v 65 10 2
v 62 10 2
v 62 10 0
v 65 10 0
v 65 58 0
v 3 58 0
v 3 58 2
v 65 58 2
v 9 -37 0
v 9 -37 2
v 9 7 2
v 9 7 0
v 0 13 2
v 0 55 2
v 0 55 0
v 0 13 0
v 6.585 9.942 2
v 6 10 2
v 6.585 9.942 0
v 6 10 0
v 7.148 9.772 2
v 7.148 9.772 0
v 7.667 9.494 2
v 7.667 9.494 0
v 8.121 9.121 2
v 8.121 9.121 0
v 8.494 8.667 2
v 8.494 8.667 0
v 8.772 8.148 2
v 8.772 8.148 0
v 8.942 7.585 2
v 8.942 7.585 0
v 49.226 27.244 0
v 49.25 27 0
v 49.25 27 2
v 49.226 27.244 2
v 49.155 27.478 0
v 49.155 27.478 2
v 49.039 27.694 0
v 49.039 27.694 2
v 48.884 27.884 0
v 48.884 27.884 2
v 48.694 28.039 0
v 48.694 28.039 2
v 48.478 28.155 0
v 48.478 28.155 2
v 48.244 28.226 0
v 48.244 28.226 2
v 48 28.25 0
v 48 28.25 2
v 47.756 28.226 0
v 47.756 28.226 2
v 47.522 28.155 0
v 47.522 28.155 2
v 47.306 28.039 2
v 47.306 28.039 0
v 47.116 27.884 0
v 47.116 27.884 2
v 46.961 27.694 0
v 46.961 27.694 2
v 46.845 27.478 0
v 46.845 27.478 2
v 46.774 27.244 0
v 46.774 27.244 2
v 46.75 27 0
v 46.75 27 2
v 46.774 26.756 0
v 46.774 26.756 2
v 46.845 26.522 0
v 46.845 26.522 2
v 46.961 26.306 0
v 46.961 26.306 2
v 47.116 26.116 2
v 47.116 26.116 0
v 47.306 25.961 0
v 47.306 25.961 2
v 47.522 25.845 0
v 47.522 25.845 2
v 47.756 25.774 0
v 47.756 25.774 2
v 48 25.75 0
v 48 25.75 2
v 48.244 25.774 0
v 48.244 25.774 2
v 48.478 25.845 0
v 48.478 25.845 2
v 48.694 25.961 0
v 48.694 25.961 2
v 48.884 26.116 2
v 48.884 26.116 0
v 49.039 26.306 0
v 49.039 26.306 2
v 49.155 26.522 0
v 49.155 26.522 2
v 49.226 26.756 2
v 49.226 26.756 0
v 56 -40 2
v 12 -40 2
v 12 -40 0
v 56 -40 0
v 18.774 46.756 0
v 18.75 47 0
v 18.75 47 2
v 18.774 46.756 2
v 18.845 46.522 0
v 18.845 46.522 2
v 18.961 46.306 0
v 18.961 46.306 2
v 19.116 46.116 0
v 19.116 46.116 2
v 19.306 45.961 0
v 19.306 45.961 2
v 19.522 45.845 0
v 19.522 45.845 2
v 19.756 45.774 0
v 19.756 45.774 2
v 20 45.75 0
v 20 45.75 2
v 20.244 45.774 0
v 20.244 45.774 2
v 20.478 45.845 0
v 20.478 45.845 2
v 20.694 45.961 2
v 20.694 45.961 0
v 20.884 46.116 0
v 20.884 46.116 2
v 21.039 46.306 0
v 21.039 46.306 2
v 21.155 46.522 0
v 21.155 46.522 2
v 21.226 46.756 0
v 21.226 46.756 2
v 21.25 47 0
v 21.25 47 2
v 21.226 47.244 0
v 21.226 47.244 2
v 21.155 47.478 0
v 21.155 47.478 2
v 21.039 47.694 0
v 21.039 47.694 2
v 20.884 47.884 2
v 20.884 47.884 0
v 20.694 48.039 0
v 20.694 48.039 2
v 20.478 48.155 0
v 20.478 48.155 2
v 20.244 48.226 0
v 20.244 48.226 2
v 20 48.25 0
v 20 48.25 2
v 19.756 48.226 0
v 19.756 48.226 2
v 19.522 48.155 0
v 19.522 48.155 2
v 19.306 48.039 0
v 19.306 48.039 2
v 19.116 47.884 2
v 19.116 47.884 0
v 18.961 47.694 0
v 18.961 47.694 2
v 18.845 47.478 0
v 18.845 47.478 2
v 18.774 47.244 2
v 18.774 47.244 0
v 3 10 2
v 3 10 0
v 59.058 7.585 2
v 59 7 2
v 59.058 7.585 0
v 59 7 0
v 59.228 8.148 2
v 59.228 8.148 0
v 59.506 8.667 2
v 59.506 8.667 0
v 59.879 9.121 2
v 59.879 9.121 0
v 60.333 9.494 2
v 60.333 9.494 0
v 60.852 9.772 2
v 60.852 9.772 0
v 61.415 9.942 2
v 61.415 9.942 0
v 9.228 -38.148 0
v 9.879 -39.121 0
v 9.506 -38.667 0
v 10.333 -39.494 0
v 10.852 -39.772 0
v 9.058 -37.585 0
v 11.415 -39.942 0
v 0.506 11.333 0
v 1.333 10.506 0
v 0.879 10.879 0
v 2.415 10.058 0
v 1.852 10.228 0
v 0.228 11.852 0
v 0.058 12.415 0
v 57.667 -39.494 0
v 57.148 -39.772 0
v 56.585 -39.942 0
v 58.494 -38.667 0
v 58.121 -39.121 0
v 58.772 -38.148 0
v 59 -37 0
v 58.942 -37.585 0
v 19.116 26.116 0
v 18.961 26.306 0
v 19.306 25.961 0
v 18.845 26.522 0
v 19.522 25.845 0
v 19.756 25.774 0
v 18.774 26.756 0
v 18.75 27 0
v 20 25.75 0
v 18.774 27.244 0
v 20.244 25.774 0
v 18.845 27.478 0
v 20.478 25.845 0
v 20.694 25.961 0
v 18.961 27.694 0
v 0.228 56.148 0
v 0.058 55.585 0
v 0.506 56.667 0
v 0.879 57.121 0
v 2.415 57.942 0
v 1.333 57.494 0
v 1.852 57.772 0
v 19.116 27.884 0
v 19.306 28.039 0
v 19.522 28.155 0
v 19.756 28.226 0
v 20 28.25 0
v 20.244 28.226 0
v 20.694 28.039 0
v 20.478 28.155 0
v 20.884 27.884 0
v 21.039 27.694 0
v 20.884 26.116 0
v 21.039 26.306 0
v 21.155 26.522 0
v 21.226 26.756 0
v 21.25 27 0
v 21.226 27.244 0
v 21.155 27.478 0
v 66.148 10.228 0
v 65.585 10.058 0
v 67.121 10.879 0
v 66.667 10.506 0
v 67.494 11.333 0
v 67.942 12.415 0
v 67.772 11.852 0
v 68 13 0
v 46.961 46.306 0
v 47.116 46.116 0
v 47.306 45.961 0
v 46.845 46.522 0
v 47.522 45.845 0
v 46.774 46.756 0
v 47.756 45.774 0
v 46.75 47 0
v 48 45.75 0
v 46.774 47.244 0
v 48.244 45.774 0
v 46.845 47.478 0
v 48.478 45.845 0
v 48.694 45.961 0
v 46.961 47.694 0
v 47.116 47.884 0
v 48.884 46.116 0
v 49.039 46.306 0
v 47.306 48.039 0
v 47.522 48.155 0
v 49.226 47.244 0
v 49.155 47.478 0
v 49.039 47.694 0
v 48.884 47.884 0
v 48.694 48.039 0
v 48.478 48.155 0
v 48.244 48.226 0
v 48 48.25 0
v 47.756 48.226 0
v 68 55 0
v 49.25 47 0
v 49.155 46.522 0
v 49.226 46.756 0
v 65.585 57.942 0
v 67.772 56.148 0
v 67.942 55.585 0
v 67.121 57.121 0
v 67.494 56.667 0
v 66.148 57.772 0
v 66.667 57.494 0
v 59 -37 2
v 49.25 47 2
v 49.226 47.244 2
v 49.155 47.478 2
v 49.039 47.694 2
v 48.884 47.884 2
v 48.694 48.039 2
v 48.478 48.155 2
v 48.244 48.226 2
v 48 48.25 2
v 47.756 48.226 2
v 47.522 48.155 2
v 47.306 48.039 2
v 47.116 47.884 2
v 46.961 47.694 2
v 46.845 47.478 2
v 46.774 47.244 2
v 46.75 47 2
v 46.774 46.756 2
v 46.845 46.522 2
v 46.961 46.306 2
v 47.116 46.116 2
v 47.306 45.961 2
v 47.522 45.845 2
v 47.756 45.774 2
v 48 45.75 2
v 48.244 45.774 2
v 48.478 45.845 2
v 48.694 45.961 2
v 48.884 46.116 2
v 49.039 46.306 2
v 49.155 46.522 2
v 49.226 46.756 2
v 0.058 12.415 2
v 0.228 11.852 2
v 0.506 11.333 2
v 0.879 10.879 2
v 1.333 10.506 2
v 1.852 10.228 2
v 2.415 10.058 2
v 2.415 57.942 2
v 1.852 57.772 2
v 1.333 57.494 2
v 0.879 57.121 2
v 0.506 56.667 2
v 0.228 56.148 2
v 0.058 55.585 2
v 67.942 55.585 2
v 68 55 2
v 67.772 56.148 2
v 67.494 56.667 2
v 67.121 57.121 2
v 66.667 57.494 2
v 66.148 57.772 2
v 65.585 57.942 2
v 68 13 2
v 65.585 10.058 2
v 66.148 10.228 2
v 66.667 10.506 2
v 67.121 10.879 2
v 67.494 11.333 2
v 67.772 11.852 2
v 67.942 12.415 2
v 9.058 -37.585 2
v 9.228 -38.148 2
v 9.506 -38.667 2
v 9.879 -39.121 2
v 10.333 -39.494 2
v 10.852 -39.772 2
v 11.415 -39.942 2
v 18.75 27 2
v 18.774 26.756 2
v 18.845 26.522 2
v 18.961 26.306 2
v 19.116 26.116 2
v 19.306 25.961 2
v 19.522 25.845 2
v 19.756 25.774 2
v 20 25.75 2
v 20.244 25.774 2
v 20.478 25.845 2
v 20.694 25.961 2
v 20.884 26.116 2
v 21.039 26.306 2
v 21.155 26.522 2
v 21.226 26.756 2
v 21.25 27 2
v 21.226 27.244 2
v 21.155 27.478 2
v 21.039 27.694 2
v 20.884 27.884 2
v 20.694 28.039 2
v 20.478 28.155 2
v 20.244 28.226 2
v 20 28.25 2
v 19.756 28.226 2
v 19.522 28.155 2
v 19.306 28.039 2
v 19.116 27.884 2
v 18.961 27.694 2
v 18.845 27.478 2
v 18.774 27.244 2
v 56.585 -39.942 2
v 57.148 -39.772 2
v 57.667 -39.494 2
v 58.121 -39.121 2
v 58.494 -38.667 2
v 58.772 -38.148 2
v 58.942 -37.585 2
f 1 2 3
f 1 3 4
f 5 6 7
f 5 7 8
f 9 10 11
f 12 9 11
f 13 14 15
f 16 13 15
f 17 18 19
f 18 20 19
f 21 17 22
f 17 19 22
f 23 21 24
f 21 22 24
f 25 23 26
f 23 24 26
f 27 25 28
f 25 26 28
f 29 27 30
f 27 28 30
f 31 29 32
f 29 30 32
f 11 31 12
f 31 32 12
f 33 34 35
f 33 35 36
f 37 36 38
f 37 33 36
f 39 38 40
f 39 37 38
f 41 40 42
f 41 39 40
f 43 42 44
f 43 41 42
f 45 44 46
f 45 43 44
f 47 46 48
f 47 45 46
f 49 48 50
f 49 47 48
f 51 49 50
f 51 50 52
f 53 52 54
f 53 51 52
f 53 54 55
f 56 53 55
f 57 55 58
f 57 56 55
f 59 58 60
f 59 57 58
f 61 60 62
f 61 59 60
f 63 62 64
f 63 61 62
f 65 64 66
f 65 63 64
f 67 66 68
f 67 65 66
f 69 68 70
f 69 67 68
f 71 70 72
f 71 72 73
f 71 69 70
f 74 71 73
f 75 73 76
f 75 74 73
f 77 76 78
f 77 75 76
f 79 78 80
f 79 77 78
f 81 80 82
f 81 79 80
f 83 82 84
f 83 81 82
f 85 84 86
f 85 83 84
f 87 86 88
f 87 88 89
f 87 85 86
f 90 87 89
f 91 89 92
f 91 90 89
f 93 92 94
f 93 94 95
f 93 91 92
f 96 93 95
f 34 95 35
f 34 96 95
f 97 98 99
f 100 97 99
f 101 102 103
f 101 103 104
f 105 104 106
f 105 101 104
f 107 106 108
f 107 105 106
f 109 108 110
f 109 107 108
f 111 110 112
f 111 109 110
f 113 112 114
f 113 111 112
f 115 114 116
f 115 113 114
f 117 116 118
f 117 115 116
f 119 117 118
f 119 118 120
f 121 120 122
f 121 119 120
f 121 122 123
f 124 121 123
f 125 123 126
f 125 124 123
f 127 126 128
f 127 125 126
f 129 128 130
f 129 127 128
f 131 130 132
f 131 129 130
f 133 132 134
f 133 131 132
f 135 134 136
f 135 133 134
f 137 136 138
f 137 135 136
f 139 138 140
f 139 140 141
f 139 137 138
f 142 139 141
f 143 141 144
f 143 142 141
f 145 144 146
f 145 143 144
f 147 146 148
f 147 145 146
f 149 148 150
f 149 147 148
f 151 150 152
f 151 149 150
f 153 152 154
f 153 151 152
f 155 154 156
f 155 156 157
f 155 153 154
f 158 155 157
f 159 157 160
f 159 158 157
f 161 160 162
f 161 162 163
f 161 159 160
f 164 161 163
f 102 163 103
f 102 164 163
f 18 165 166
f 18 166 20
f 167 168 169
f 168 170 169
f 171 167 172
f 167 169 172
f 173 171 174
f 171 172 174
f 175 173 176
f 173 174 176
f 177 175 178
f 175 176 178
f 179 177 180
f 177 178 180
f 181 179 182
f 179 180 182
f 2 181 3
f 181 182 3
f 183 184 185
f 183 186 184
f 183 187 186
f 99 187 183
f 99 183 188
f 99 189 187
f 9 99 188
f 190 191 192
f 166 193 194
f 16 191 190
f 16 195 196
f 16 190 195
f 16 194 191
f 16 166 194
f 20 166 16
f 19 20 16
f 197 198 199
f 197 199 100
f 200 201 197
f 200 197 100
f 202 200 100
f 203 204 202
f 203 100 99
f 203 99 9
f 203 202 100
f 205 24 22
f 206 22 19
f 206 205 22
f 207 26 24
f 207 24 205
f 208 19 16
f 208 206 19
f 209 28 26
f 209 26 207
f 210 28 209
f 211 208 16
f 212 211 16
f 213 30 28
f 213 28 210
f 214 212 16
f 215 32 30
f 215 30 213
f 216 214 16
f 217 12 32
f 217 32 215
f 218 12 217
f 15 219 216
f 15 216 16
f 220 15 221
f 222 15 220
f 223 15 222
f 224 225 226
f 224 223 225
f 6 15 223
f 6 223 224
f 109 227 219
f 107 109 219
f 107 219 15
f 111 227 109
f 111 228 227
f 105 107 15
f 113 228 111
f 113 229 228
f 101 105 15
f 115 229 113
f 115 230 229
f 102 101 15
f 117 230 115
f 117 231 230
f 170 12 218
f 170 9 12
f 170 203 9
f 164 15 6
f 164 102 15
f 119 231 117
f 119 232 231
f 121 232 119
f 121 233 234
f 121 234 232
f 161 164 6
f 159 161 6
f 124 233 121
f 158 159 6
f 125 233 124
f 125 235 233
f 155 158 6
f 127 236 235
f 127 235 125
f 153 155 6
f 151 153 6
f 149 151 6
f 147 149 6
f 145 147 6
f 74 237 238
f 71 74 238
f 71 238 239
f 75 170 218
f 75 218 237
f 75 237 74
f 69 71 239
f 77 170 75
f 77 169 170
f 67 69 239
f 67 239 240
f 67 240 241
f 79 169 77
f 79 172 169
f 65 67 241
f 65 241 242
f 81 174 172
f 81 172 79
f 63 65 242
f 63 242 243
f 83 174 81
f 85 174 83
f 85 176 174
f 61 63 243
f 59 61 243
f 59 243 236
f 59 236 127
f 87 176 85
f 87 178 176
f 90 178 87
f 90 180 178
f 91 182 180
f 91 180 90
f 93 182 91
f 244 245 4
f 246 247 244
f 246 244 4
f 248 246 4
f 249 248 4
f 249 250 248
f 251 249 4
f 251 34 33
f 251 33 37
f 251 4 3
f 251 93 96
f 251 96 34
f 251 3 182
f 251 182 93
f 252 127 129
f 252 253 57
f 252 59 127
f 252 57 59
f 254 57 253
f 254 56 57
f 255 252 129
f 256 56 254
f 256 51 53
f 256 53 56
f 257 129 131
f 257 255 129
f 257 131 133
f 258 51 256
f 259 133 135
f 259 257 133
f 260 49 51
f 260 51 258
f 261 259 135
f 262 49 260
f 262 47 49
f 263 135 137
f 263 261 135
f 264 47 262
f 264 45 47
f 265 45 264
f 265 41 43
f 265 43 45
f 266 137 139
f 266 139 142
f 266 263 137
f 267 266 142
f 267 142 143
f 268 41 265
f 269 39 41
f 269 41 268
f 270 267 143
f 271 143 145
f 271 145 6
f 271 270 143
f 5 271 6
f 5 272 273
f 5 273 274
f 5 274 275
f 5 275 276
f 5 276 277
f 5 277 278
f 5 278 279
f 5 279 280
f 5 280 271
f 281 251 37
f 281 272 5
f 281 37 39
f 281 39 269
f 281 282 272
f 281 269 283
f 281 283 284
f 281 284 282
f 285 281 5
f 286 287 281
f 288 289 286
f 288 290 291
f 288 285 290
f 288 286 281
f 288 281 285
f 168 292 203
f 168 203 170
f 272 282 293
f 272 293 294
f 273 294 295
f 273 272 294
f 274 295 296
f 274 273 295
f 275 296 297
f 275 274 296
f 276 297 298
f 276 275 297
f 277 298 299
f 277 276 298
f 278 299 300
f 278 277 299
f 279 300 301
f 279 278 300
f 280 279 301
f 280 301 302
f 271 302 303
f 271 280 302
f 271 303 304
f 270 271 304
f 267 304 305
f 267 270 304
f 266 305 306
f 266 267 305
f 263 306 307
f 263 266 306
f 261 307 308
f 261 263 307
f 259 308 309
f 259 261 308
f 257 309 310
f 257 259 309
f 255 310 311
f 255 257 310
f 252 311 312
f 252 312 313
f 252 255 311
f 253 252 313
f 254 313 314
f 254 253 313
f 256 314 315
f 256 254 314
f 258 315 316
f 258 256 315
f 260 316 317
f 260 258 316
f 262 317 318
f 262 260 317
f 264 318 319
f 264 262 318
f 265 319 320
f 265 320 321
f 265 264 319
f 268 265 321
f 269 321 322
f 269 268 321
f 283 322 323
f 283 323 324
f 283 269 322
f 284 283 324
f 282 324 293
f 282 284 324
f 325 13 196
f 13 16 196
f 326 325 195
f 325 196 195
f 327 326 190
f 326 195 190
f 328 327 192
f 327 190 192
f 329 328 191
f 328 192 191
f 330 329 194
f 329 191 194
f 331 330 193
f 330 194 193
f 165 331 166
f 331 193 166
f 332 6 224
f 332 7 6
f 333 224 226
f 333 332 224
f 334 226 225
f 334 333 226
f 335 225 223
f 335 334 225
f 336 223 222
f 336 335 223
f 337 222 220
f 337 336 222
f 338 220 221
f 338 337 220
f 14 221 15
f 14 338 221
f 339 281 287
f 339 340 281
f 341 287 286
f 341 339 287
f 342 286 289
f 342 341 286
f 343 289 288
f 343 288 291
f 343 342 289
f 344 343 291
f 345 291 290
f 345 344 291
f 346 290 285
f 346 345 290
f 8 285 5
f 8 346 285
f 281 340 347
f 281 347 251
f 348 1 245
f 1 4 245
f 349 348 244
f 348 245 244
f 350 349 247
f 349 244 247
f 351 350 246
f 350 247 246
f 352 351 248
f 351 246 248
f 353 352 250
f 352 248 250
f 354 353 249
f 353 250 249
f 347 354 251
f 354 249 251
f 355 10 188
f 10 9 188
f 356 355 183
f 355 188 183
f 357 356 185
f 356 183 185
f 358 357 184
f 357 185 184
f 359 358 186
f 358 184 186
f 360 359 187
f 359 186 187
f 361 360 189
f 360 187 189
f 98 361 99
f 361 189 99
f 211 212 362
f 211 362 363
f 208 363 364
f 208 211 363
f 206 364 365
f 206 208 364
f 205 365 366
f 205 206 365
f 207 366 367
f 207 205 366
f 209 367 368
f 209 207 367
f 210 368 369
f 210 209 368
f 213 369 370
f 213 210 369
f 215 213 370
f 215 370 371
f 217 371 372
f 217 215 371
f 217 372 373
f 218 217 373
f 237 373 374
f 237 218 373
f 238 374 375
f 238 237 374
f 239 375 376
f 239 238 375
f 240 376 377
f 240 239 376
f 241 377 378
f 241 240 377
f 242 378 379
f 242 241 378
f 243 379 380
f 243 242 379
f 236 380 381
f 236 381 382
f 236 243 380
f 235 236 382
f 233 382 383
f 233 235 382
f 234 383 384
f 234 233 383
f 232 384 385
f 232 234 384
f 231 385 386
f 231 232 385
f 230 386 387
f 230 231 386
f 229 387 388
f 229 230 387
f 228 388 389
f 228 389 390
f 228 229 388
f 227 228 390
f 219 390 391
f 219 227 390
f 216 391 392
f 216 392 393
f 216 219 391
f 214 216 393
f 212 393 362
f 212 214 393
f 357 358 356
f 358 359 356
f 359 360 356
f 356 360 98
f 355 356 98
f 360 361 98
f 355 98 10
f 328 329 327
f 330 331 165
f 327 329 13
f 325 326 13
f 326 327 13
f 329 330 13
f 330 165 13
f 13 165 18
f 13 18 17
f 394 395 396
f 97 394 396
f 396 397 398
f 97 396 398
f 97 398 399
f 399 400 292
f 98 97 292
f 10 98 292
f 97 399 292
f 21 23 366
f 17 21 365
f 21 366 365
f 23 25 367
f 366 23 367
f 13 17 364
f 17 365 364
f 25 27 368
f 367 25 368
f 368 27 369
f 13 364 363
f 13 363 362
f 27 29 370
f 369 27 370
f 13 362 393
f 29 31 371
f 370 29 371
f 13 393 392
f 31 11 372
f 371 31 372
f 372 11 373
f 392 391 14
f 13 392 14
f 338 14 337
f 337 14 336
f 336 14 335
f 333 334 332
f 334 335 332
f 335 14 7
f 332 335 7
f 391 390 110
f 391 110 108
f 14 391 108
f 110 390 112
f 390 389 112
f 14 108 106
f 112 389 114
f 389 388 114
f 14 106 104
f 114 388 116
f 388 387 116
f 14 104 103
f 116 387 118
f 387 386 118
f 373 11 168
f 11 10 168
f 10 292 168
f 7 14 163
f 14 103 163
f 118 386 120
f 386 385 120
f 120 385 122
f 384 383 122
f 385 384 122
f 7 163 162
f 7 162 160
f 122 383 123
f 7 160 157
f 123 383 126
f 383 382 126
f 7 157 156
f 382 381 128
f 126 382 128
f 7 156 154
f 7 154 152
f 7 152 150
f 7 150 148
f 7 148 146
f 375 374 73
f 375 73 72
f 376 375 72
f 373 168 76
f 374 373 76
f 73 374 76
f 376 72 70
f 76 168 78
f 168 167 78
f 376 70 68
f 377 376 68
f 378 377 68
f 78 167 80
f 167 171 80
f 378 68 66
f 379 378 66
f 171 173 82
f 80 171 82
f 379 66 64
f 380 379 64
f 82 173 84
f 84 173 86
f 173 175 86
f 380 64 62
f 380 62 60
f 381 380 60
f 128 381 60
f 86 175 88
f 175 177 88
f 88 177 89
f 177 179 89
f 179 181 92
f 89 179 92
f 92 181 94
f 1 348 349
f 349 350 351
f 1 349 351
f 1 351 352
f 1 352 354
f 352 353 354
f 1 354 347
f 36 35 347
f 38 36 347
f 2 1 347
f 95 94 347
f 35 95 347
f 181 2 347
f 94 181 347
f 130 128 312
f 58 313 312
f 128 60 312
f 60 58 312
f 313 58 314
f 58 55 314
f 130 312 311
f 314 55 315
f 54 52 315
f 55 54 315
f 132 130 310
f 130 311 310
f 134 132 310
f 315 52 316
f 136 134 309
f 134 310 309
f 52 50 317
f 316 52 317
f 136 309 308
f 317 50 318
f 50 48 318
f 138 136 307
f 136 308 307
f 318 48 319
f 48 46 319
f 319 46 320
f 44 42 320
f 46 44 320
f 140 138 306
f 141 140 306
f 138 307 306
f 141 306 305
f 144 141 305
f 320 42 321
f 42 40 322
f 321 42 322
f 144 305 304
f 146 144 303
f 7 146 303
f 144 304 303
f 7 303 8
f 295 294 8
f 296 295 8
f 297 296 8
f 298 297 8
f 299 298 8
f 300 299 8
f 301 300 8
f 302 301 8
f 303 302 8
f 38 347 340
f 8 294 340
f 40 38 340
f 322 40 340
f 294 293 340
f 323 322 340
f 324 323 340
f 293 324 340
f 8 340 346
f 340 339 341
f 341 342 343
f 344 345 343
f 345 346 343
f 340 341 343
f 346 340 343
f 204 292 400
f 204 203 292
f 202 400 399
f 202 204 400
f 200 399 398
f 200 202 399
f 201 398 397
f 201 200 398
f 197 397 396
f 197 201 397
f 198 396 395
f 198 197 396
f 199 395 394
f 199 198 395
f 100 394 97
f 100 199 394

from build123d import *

# Parameters (mm, degrees)
SKETCH_1_W          = 68
SKETCH_1_H          = 58
SKETCH_1_R          = 1.25
EXTRUDE_1_DEPTH     = 2
SKETCH_2_W          = 2
SKETCH_2_H          = 40
EXTRUDE_2_DEPTH     = 68
SKETCH_3_W          = 9
SKETCH_3_H          = 50
CUT_EXTRUDE_1_DEPTH = 10
FILLET_1_R          = 3


with BuildPart() as part:
    # 草图1 → 凸台-拉伸1 (new body)
    with BuildSketch(Plane.XY):
        with Locations((34, 29)):
            Rectangle(SKETCH_1_W, SKETCH_1_H)
        with Locations((48, 27)):
            Circle(SKETCH_1_R, mode=Mode.SUBTRACT)
        with Locations(Location((20, 27, 0), (0, 0, 180))):
            Circle(SKETCH_1_R, mode=Mode.SUBTRACT)
        with Locations((48, 47)):
            Circle(SKETCH_1_R, mode=Mode.SUBTRACT)
        with Locations(Location((20, 47, 0), (0, 0, 180))):
            Circle(SKETCH_1_R, mode=Mode.SUBTRACT)
    extrude(amount=EXTRUDE_1_DEPTH)

    # 草图2 → 凸台-拉伸2 (add)
    with BuildSketch(Plane(origin=(68, 0, 0), x_dir=(0, 0, -1), z_dir=(1, 0, 0))):
        with Locations((-1, -20)):
            Rectangle(SKETCH_2_W, SKETCH_2_H)
    extrude(amount=-EXTRUDE_2_DEPTH)

    # 草图3 → 切除-拉伸1 (cut)
    with BuildSketch(Plane.XY.offset(2)):
        with Locations((4.5, -15)):
            Rectangle(SKETCH_3_W, SKETCH_3_H)
        with Locations((63.5, -15)):
            Rectangle(SKETCH_3_W, SKETCH_3_H)
    extrude(amount=-CUT_EXTRUDE_1_DEPTH, mode=Mode.SUBTRACT)

    # 圆角1
    fillet_1_edges = [part.edges().sort_by_distance(p)[0] for p in [
        (59, -40, 1),
        (9, -40, 1),
        (0, 10, 1),
        (9, 10, 1),
        (68, 10, 1),
        (59, 10, 1),
        (0, 58, 1),
        (68, 58, 1),
    ]]
    fillet(fillet_1_edges, radius=FILLET_1_R)


solid = part.part
